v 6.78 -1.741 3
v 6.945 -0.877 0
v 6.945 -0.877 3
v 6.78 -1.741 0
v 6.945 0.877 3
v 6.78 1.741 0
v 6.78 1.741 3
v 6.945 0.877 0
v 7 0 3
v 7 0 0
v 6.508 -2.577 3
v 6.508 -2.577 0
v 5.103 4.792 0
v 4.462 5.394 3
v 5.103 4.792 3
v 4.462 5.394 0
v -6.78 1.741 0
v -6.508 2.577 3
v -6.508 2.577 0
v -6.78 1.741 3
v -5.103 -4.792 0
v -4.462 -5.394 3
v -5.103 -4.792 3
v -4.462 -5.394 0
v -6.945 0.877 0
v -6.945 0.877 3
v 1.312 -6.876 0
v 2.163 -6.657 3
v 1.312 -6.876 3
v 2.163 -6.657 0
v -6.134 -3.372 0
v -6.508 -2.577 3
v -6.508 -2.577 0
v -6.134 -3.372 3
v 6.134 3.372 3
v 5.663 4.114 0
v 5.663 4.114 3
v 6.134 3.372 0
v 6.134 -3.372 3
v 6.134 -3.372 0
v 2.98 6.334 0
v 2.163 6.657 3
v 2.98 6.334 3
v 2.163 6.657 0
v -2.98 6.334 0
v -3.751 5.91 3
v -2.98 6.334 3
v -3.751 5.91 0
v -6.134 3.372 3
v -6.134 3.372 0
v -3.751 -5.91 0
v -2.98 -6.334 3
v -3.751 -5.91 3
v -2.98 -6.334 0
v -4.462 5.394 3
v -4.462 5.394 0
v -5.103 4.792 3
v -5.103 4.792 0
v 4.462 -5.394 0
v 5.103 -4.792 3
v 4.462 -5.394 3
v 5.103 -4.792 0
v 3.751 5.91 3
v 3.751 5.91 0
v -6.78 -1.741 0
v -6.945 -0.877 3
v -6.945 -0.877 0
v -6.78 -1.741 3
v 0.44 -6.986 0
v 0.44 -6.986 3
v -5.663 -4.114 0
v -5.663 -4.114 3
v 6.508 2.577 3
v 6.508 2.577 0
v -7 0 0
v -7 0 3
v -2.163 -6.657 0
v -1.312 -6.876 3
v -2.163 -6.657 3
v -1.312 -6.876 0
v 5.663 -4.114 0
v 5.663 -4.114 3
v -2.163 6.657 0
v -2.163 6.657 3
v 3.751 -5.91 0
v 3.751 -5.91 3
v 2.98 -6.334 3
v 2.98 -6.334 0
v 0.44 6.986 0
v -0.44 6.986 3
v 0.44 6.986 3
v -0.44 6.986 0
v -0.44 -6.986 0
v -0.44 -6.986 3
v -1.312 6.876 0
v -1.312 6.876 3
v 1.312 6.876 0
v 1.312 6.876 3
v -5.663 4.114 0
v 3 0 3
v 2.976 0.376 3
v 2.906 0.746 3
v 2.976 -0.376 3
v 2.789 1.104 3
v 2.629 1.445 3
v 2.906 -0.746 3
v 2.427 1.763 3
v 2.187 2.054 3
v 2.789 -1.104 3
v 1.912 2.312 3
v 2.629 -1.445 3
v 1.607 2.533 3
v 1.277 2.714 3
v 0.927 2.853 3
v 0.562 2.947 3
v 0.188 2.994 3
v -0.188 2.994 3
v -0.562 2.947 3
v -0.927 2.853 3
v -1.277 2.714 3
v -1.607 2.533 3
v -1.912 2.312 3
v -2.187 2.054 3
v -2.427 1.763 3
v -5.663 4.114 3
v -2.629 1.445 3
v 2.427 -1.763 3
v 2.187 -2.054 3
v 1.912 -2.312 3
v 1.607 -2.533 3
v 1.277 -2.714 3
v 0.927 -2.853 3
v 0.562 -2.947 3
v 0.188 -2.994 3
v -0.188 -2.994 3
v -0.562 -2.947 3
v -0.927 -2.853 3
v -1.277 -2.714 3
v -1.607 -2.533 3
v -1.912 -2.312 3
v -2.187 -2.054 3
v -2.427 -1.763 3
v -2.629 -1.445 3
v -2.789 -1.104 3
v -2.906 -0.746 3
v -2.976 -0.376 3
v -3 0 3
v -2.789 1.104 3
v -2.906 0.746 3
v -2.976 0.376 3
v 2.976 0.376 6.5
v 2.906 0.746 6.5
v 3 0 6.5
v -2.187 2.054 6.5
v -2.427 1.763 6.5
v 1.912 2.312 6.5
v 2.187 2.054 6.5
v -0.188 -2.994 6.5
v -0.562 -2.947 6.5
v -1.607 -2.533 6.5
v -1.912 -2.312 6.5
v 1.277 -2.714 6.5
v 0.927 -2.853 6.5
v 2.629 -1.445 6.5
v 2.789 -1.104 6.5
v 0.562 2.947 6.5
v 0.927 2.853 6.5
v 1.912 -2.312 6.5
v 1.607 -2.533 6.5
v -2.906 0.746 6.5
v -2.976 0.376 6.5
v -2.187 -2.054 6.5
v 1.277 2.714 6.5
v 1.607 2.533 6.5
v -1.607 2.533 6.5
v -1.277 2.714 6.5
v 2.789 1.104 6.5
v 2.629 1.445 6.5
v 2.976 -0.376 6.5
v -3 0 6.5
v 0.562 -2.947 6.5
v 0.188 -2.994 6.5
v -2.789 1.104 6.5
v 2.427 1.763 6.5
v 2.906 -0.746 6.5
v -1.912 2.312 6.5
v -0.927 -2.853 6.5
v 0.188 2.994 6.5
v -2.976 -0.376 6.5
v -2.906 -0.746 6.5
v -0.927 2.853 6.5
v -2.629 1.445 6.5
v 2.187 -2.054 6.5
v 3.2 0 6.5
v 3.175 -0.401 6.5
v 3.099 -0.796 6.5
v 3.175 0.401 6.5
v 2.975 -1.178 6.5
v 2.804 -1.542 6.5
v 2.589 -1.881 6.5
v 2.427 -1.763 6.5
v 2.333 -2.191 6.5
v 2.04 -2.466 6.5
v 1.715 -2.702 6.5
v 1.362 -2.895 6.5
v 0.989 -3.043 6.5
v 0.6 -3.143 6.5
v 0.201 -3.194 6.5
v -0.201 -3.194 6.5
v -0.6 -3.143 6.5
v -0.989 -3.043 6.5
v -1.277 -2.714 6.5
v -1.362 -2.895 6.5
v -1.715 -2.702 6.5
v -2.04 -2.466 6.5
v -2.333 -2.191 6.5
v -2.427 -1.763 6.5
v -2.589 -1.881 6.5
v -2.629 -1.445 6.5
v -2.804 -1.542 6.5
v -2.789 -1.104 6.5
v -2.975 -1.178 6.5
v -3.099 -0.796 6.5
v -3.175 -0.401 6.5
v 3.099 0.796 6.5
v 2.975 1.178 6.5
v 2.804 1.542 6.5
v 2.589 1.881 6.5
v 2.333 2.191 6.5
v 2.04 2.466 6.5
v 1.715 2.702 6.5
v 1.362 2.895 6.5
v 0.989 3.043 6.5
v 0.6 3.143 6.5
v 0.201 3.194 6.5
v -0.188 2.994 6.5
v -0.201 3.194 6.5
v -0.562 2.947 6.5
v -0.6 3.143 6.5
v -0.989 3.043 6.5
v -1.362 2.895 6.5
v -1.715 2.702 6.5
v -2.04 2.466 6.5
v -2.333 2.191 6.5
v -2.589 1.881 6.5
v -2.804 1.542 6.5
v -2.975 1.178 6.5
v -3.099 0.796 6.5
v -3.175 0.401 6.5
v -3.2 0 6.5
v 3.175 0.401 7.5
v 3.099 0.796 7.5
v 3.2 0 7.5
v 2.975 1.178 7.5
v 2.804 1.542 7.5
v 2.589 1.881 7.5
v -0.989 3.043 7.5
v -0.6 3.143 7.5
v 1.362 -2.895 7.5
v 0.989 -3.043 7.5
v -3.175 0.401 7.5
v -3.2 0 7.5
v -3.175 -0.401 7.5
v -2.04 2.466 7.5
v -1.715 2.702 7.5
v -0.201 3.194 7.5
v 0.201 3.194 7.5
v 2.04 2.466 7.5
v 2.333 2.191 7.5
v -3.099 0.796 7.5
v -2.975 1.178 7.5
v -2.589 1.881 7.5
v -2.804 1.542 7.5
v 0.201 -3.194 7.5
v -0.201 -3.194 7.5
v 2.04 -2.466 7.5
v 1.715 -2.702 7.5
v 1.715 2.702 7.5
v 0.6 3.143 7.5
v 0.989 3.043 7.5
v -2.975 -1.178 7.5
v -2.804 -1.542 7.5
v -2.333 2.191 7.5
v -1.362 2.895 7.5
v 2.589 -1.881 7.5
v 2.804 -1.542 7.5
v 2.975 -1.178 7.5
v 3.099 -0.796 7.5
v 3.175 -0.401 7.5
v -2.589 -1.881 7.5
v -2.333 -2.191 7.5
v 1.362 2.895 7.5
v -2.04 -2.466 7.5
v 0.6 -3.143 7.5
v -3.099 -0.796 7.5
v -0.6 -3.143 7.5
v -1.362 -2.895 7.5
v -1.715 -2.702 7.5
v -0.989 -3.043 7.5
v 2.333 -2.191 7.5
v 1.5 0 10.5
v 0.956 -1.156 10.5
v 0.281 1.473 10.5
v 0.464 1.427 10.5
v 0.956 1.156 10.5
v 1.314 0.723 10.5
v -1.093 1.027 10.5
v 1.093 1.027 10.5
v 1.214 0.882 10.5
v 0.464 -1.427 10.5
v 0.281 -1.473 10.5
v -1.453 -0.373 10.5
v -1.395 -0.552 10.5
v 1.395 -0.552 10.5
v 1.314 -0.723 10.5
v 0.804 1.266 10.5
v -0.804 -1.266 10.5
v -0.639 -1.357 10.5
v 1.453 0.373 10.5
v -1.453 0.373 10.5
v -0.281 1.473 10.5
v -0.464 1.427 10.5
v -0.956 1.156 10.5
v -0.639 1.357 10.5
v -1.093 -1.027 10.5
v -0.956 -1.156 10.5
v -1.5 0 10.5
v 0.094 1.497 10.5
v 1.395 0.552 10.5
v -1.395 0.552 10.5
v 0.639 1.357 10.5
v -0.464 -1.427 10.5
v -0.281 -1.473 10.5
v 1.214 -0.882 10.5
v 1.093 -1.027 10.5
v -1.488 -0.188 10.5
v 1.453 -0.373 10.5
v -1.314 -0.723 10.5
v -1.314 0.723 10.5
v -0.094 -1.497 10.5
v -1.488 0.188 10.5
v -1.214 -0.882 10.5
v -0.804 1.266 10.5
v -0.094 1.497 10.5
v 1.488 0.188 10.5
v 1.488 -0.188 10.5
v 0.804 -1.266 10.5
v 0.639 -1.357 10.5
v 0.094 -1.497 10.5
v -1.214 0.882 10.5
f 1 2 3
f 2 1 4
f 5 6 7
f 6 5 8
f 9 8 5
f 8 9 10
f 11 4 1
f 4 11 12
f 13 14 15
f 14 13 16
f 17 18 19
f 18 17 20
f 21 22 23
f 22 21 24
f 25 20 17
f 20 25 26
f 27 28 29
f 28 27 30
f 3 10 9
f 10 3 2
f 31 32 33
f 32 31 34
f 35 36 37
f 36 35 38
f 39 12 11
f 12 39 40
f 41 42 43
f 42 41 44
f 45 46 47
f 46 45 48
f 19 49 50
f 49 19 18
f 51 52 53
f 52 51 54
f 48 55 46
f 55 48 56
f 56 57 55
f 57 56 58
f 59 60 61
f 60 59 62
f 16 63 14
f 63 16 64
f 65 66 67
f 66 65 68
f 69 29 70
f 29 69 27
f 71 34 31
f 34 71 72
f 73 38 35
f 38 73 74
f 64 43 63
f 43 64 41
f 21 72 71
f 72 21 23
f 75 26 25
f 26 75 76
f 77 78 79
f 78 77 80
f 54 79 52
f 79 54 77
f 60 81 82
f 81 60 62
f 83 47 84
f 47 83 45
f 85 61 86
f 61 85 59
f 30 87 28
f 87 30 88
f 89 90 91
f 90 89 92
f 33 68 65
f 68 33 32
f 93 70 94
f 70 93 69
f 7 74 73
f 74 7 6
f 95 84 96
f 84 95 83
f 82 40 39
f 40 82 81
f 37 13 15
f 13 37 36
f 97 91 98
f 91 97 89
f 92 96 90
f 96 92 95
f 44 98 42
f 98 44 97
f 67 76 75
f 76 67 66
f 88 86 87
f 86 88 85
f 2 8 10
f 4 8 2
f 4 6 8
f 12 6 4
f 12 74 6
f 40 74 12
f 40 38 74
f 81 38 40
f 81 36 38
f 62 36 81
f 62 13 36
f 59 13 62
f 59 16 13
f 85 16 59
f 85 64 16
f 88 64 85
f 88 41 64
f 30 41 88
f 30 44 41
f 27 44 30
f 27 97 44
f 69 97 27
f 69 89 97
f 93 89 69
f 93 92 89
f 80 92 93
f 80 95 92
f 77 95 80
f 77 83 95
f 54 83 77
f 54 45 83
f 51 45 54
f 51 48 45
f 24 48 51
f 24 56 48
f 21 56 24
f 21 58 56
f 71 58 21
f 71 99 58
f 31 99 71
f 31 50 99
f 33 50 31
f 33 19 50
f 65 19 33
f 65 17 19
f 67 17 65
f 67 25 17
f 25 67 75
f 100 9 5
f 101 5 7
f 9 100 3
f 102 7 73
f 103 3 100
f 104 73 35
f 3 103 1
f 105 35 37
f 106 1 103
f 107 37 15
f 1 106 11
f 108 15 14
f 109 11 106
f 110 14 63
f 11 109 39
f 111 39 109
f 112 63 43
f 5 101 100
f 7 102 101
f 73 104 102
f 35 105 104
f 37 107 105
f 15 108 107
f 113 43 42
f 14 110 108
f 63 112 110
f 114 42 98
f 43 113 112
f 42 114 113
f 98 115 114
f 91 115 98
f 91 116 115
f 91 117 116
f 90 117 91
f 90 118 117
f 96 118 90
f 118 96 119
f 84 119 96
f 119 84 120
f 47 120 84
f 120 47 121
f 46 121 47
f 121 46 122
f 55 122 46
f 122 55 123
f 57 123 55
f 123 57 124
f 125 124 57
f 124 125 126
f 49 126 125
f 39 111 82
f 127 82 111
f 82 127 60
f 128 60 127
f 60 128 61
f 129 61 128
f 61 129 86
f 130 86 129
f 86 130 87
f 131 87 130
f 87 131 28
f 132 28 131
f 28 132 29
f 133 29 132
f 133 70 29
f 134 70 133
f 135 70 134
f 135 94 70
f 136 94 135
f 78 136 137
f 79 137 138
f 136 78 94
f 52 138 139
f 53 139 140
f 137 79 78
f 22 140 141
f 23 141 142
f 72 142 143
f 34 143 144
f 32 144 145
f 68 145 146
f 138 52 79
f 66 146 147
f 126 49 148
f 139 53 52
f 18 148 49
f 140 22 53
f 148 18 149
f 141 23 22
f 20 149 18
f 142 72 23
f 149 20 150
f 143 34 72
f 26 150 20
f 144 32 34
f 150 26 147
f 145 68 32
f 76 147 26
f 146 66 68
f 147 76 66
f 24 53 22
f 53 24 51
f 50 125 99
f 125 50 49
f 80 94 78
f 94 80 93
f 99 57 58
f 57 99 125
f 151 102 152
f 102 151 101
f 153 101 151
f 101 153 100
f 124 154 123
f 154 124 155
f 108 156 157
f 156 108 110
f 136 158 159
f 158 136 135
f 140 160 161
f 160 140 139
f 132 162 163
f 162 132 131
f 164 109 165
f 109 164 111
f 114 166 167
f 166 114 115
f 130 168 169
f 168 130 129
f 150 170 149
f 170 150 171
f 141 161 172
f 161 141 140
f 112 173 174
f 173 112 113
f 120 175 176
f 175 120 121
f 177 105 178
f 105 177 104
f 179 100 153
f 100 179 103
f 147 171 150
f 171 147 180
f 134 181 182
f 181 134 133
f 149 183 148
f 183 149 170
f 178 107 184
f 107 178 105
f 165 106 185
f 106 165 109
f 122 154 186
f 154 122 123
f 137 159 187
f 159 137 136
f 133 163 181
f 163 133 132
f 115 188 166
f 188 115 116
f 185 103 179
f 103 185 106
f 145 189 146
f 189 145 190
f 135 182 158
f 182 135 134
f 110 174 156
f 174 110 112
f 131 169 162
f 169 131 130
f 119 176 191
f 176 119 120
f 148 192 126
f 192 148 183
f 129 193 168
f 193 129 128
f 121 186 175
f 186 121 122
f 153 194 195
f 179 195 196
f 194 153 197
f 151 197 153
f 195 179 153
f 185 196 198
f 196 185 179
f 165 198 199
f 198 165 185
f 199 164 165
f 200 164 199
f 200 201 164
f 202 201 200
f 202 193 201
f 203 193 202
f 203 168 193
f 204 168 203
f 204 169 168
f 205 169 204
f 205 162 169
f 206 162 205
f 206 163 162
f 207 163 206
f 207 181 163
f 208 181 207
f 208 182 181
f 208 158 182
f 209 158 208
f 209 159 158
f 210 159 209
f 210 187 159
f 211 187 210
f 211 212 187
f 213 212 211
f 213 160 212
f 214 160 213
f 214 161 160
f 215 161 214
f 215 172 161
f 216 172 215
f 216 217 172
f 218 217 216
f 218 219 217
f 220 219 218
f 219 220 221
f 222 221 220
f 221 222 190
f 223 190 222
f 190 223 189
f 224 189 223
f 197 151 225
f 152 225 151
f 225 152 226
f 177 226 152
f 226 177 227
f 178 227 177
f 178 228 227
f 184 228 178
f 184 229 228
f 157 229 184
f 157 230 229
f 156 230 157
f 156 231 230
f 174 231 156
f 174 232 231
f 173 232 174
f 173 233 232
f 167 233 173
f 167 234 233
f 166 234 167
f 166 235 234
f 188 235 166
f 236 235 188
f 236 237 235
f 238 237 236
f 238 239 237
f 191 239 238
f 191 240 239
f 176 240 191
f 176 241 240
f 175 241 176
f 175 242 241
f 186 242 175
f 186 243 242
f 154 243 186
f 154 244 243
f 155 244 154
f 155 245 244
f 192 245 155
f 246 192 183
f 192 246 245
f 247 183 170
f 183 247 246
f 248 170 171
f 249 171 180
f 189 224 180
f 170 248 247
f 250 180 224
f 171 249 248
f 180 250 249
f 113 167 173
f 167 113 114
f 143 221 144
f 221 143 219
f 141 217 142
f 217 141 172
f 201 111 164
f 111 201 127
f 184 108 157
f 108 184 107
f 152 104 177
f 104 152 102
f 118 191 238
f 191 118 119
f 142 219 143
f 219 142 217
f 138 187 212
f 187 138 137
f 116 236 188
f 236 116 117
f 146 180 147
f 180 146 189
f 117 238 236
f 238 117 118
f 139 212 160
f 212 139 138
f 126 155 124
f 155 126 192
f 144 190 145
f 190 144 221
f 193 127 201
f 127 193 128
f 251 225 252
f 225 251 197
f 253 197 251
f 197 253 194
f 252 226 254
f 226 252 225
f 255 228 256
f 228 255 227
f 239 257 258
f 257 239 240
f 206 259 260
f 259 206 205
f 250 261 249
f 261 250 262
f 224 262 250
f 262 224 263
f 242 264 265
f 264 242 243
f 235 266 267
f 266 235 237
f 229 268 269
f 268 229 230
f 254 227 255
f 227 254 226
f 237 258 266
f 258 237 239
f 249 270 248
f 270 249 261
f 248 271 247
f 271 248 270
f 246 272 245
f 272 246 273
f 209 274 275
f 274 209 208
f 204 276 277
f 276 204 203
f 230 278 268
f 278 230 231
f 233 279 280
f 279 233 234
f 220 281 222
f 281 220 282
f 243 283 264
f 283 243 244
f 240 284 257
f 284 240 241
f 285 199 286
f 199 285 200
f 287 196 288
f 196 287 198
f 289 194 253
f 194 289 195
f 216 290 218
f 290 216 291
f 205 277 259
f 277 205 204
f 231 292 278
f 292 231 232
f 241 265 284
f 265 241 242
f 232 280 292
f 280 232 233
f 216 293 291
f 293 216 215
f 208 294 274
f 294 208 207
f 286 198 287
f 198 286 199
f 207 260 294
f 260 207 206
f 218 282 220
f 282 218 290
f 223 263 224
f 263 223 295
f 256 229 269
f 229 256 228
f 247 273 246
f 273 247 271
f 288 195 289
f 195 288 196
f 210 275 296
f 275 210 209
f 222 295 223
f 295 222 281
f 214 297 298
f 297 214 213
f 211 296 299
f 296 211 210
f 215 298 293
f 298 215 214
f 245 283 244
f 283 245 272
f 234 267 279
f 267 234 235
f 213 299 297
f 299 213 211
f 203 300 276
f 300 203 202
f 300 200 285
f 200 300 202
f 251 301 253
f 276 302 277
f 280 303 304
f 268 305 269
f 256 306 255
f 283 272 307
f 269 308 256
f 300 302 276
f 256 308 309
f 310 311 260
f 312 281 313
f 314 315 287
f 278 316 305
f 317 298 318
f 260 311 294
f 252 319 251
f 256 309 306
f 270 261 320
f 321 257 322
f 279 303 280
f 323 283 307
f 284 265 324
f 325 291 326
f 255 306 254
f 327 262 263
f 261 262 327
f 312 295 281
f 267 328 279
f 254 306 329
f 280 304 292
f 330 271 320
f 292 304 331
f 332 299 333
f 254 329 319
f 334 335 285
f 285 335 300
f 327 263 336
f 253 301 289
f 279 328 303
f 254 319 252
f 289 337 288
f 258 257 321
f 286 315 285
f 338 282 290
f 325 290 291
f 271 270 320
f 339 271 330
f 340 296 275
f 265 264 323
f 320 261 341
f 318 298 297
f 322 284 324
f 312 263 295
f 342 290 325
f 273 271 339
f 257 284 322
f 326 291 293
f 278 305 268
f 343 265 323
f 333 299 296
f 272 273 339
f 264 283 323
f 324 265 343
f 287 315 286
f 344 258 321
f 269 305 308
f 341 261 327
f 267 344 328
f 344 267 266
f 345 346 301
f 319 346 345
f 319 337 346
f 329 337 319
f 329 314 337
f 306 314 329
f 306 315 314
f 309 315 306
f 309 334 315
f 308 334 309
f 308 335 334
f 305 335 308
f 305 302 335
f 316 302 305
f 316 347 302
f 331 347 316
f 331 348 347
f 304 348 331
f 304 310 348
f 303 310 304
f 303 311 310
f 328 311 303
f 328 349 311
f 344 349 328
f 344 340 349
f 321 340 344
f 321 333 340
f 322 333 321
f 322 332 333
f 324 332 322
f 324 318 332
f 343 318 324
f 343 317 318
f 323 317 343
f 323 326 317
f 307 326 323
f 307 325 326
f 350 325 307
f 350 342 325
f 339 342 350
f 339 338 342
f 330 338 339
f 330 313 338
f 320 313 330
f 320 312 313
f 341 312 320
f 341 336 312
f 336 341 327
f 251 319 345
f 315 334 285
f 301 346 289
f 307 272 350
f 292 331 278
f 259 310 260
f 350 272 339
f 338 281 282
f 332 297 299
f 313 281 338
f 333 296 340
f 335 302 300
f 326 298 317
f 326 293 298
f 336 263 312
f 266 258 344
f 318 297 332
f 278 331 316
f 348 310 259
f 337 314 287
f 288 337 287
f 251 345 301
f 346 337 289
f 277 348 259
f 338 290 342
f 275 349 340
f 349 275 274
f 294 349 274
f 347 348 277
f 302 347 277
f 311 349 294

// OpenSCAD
// Honda Pedal Stop

// Increase resolution
$fn=50;

// Variables
face_d = 7;
face_h = 3;
shaft_d = 3;
shaft_h = 3.5;
bump_d = 3.2;
bump_h = 1;
cone_h = 3;
cone_end_d = 1.5;

// Face
cylinder(h=face_h,r=face_d);

// Shaft
translate([0,0,face_h]) cylinder(h=shaft_h,r=shaft_d);

// Bump
translate([0,0,face_h+shaft_h]) cylinder(h=bump_h,r=bump_d);

// Cone
translate([0,0,(face_h+shaft_h+bump_h)]) cylinder(h=cone_h,r1=bump_d,r2=cone_end_d);



